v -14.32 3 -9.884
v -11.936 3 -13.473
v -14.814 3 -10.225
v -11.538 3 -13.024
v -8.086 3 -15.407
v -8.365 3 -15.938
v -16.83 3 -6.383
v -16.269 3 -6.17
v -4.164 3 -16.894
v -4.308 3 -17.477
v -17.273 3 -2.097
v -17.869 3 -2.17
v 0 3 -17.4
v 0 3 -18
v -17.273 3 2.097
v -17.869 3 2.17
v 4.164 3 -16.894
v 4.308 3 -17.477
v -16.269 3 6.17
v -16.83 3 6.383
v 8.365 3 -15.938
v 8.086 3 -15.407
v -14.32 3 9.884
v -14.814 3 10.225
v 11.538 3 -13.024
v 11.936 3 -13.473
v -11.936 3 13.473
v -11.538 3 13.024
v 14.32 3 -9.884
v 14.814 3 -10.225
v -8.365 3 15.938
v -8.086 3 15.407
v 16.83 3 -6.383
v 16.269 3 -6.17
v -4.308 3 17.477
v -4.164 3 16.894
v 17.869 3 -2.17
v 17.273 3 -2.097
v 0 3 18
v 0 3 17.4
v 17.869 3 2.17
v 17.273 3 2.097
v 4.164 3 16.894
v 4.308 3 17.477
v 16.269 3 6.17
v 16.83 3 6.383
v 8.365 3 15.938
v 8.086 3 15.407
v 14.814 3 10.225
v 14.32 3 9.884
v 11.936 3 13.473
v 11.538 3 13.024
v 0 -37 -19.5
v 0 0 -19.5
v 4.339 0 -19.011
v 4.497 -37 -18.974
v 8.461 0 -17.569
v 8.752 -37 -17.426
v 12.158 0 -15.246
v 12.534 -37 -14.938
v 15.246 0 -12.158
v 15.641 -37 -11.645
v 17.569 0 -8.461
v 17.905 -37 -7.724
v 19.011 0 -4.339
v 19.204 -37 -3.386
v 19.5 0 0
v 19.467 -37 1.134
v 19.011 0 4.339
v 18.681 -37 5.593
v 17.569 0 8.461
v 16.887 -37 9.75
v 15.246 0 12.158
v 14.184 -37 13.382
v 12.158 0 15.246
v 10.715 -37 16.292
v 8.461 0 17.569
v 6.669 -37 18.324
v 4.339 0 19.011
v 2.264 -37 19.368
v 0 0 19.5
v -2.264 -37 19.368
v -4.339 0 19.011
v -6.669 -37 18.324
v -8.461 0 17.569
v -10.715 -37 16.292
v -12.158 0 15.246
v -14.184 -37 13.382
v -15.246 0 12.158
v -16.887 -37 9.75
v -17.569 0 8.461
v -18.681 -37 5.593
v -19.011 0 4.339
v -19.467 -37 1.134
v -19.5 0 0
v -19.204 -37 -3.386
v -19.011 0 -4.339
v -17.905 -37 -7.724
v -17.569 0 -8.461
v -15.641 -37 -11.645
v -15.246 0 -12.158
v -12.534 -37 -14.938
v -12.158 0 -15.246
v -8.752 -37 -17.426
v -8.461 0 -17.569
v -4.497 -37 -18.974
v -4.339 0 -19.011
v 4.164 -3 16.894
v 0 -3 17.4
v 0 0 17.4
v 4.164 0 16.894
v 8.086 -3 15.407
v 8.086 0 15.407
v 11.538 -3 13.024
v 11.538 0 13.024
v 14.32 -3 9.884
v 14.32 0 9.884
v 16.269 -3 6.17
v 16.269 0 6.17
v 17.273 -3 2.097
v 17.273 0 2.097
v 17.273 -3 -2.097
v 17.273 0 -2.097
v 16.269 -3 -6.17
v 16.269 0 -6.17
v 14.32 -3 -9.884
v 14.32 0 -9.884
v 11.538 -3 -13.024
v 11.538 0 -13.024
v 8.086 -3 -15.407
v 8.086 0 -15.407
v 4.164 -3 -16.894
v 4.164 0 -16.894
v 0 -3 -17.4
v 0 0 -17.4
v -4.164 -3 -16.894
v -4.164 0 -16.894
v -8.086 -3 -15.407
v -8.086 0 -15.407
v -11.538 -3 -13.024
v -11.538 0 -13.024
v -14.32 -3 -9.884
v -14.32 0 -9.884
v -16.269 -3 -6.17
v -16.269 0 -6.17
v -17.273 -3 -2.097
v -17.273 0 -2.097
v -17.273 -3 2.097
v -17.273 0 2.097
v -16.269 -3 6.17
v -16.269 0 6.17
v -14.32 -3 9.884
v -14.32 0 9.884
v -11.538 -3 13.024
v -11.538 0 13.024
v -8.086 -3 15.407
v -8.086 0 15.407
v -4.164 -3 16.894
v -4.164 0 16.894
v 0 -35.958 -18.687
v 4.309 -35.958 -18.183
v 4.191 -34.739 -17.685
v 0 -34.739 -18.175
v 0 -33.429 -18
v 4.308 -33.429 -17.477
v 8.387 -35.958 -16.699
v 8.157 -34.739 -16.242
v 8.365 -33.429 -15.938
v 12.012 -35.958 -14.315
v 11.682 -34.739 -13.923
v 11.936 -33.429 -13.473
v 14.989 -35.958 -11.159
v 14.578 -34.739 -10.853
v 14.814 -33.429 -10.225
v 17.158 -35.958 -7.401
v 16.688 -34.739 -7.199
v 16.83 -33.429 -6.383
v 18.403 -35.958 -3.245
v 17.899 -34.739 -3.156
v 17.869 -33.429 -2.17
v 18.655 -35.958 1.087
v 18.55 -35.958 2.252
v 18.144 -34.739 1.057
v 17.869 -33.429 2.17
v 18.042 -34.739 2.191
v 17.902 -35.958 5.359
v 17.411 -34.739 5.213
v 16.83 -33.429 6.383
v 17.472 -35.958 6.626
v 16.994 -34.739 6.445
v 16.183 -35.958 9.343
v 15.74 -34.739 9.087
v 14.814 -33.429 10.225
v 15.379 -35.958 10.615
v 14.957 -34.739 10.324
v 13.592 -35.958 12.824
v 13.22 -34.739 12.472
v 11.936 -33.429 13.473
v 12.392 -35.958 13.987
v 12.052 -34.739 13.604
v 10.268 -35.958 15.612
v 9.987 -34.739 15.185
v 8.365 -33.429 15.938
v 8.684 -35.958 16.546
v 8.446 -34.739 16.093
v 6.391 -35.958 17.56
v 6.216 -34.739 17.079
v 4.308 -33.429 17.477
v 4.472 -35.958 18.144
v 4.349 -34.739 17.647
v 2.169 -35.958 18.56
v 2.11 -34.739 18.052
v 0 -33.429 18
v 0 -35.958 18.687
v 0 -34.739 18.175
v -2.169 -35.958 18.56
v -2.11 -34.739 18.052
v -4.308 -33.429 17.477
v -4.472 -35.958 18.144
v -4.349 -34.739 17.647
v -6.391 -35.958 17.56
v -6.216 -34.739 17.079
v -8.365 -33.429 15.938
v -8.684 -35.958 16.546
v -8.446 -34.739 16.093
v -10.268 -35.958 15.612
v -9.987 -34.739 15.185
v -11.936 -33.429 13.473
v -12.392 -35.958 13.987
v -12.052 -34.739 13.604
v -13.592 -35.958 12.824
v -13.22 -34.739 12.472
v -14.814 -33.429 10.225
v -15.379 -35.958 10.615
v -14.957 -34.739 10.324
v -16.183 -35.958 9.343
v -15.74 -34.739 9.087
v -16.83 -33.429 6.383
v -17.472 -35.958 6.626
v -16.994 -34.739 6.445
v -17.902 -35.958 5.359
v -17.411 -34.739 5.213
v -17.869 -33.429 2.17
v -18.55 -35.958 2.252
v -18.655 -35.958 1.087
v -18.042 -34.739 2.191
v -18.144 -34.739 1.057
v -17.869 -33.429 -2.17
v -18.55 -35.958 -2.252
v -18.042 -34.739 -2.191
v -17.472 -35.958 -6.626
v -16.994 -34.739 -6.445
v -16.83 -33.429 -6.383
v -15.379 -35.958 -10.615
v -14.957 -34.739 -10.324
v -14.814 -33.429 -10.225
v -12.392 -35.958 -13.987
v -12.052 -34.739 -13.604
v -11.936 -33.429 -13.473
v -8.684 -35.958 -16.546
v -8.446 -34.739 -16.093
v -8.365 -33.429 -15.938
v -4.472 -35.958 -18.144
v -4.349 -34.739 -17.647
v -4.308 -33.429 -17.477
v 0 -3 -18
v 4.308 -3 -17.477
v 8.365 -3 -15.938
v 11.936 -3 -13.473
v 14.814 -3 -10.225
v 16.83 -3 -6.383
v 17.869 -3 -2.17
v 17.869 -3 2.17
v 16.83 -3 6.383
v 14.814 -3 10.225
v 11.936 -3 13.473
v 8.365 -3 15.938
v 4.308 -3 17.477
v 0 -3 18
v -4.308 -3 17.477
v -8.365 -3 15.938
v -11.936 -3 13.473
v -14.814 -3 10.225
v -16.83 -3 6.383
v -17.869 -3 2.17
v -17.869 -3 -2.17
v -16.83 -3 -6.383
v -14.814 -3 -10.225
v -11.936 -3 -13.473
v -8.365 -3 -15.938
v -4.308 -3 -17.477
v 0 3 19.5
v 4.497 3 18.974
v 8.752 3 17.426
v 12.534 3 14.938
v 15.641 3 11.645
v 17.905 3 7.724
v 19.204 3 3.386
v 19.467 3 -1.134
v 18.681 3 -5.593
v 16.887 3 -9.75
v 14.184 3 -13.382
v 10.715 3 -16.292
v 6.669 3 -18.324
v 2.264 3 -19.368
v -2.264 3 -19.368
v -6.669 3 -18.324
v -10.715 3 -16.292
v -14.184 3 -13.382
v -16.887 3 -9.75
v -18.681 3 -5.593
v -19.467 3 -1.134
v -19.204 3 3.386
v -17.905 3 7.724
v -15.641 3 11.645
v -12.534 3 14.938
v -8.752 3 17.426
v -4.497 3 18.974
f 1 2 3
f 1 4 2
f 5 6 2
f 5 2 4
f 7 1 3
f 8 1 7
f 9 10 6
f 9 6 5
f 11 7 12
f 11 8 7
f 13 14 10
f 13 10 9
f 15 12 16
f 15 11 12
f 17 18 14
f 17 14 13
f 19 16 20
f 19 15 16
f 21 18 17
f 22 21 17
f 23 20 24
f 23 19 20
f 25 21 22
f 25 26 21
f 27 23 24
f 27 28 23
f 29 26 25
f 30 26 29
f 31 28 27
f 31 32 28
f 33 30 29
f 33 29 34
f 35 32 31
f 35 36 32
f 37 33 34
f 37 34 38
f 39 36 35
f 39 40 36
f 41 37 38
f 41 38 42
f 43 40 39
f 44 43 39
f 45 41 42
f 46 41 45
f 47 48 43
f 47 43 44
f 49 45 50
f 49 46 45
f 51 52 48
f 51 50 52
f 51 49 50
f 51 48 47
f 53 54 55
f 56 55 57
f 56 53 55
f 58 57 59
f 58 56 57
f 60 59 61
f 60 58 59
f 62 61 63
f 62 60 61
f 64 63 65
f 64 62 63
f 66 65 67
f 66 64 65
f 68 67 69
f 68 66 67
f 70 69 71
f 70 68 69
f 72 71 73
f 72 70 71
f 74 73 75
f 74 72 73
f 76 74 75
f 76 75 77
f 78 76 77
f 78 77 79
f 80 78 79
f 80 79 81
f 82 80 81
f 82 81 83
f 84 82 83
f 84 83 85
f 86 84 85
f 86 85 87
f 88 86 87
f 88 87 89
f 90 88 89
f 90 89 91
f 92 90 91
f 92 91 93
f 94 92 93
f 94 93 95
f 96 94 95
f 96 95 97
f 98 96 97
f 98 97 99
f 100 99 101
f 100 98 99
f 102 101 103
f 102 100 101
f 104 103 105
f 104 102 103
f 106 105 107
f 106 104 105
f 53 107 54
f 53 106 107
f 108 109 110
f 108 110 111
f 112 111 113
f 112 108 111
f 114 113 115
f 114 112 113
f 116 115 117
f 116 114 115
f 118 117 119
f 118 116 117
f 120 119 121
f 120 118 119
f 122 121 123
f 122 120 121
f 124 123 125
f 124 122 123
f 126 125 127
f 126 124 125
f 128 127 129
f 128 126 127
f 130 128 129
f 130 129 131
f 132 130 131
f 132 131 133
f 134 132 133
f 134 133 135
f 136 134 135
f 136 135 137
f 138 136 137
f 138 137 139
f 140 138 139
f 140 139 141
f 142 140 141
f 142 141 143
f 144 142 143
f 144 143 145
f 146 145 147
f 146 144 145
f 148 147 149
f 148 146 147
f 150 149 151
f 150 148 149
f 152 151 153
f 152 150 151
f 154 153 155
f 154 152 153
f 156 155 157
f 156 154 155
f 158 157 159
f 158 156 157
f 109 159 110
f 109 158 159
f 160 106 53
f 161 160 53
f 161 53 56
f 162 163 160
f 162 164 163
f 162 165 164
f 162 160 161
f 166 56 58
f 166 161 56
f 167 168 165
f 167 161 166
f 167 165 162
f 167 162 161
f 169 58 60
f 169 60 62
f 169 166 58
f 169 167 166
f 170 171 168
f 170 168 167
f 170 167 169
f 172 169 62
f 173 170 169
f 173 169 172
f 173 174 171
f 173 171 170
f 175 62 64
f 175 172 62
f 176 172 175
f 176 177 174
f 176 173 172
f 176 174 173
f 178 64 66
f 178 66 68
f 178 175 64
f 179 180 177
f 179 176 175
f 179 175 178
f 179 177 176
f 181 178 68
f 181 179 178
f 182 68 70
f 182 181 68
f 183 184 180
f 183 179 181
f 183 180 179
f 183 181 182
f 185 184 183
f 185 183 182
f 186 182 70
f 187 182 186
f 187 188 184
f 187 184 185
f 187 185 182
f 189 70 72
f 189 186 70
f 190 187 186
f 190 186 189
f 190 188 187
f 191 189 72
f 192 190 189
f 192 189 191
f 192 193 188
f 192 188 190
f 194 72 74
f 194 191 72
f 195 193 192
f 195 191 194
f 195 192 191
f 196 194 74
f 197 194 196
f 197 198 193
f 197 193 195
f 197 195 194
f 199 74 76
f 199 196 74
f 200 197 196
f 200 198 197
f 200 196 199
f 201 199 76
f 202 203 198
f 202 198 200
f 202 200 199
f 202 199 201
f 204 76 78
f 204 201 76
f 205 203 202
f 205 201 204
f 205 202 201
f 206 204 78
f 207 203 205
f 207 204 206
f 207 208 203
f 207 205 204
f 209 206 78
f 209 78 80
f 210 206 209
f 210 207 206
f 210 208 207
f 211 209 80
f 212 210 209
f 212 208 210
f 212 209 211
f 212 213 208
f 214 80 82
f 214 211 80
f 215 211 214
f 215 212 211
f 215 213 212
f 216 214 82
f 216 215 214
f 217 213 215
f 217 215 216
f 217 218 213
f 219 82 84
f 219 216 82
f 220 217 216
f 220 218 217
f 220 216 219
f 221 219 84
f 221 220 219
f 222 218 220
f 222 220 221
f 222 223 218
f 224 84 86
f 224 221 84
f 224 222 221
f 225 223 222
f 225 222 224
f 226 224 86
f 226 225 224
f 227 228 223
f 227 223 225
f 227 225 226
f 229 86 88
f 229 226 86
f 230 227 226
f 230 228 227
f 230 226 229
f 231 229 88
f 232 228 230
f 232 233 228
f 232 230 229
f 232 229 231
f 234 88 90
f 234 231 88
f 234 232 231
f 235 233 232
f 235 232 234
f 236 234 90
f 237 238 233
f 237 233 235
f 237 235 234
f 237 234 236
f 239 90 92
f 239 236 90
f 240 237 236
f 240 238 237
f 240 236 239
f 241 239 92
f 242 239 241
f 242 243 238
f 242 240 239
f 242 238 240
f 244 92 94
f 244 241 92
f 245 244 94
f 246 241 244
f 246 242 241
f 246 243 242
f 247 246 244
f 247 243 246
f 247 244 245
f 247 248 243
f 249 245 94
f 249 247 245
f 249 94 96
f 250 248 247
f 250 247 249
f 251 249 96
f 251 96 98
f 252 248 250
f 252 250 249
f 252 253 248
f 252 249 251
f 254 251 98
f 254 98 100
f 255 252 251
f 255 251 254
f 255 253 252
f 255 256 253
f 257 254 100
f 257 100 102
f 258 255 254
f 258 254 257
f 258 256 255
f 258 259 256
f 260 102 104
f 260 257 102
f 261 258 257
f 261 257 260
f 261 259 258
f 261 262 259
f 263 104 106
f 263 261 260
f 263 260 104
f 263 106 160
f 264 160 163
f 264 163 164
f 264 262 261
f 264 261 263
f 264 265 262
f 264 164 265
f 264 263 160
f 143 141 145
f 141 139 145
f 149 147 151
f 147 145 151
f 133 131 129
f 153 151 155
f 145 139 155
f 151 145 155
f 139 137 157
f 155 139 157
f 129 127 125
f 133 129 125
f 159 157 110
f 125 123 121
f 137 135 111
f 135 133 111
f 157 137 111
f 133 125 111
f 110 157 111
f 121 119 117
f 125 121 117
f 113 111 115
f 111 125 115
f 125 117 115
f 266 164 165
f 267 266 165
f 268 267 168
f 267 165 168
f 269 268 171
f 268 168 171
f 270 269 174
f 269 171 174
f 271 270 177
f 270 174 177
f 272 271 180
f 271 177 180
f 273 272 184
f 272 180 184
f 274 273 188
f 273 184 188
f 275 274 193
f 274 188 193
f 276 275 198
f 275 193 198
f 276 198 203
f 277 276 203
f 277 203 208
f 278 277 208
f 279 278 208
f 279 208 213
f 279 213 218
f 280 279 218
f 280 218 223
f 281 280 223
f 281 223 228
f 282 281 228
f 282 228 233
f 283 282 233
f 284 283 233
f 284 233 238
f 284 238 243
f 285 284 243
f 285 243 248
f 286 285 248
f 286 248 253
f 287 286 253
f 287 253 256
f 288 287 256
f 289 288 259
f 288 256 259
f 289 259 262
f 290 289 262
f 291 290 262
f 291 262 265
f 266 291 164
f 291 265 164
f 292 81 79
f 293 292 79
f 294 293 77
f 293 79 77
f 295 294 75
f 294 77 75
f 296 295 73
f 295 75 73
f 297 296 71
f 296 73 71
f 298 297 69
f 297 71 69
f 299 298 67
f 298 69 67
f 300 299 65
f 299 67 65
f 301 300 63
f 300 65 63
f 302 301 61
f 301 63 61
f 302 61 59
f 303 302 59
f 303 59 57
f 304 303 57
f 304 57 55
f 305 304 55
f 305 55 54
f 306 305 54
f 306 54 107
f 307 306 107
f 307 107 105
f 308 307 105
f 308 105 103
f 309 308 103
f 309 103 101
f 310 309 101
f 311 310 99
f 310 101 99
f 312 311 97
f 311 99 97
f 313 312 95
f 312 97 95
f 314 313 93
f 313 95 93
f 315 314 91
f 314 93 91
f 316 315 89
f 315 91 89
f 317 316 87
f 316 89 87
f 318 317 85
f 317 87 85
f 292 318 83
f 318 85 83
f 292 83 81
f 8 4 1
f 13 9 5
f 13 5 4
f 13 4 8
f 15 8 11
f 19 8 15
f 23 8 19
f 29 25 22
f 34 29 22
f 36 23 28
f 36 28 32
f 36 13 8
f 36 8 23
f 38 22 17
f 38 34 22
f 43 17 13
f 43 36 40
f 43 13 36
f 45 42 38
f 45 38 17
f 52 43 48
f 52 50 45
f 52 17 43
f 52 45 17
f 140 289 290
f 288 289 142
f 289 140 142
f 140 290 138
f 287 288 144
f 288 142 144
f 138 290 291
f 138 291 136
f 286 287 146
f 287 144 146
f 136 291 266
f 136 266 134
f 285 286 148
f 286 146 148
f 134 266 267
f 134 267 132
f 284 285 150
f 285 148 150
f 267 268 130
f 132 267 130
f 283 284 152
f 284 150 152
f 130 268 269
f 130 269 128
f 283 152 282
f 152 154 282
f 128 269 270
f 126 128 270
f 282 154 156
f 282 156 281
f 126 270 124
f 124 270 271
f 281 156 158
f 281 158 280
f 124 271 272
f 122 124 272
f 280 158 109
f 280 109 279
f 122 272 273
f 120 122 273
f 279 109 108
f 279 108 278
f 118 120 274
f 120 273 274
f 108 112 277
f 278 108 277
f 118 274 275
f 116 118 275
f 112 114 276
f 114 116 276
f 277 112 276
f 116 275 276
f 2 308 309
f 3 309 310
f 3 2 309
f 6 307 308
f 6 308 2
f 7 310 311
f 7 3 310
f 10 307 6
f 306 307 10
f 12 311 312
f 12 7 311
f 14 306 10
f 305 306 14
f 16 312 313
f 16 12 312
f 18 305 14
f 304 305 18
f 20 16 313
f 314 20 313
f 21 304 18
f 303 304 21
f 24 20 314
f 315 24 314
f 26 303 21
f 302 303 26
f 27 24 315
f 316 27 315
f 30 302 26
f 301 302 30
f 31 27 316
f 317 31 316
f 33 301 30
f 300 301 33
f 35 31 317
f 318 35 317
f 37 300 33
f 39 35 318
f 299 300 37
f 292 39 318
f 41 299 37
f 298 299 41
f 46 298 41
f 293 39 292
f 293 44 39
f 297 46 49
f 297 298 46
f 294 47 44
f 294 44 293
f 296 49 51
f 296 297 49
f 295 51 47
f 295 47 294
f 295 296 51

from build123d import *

# Parameters (mm, degrees)
SKETCH1_R           = 19.5
BOSS_EXTRUDE1_DEPTH = 3
BOSS_EXTRUDE2_START = 37
SKETCH2_R           = 19.5
SKETCH2_R_2         = 18
BOSS_EXTRUDE2_DEPTH = 37
FILLET1_R           = 5
BOSS_EXTRUDE3_START = -6
SKETCH3_R           = 18
SKETCH3_R_2         = 17.4
BOSS_EXTRUDE3_DEPTH = 6


with BuildPart() as part:
    # Sketch1 → Boss-Extrude1 (new body)
    with BuildSketch(Plane(origin=(0, 0, 0), x_dir=(1, 0, 0), z_dir=(0, 1, 0))):
        with Locations(Location((0, 0, 0), (0, 0, 270))):
            Circle(SKETCH1_R)
    extrude(amount=BOSS_EXTRUDE1_DEPTH)

    # Sketch2 → Boss-Extrude2 (add)
    with BuildSketch(Plane(origin=(0, 0, 0), x_dir=(-1, 0, 0), z_dir=(0, -1, 0)).offset(BOSS_EXTRUDE2_START)):
        with Locations(Location((0, 0, 0), (0, 0, 90))):
            Circle(SKETCH2_R)
        with Locations(Location((0, 0, 0), (0, 0, 90))):
            Circle(SKETCH2_R_2, mode=Mode.SUBTRACT)
    extrude(amount=-BOSS_EXTRUDE2_DEPTH)

    # Fillet1
    # the kernel refuses this fillet: 5 mm, written as the material it takes off along each edge
    with BuildSketch(Plane(origin=(0, -37, 0), x_dir=(0, 0, -1), z_dir=(-1, 0, 0))) as fillet1_piece_1:
        with BuildLine():
            CenterArc((23, -3.570714214), FILLET1_R, 134.427004001, 45.572995999)
            Line((18, -3.570714214), (17.9, -3.570714214))
            Line((17.9, -3.570714214), (17.9, 0))
            Line((17.9, 0), (18, 0.1))
            ThreePointArc((18, 0.1), (18.75, 0.1), (19.43, 0.071414284))
            Line((19.43, 0.071414284), (19.5, 0))
        make_face()
    revolve(axis=Axis((0, -37, 0), (0, -1, 0)), mode=Mode.SUBTRACT)

    # Sketch3 → Boss-Extrude3 (add)
    with BuildSketch(Plane(origin=(0, 3, 0), x_dir=(1, 0, 0), z_dir=(0, 1, 0)).offset(BOSS_EXTRUDE3_START)):
        with Locations(Location((0, 0, 0), (0, 0, 270))):
            Circle(SKETCH3_R)
        with Locations(Location((0, 0, 0), (0, 0, 270))):
            Circle(SKETCH3_R_2, mode=Mode.SUBTRACT)
    extrude(amount=BOSS_EXTRUDE3_DEPTH)


solid = part.part
